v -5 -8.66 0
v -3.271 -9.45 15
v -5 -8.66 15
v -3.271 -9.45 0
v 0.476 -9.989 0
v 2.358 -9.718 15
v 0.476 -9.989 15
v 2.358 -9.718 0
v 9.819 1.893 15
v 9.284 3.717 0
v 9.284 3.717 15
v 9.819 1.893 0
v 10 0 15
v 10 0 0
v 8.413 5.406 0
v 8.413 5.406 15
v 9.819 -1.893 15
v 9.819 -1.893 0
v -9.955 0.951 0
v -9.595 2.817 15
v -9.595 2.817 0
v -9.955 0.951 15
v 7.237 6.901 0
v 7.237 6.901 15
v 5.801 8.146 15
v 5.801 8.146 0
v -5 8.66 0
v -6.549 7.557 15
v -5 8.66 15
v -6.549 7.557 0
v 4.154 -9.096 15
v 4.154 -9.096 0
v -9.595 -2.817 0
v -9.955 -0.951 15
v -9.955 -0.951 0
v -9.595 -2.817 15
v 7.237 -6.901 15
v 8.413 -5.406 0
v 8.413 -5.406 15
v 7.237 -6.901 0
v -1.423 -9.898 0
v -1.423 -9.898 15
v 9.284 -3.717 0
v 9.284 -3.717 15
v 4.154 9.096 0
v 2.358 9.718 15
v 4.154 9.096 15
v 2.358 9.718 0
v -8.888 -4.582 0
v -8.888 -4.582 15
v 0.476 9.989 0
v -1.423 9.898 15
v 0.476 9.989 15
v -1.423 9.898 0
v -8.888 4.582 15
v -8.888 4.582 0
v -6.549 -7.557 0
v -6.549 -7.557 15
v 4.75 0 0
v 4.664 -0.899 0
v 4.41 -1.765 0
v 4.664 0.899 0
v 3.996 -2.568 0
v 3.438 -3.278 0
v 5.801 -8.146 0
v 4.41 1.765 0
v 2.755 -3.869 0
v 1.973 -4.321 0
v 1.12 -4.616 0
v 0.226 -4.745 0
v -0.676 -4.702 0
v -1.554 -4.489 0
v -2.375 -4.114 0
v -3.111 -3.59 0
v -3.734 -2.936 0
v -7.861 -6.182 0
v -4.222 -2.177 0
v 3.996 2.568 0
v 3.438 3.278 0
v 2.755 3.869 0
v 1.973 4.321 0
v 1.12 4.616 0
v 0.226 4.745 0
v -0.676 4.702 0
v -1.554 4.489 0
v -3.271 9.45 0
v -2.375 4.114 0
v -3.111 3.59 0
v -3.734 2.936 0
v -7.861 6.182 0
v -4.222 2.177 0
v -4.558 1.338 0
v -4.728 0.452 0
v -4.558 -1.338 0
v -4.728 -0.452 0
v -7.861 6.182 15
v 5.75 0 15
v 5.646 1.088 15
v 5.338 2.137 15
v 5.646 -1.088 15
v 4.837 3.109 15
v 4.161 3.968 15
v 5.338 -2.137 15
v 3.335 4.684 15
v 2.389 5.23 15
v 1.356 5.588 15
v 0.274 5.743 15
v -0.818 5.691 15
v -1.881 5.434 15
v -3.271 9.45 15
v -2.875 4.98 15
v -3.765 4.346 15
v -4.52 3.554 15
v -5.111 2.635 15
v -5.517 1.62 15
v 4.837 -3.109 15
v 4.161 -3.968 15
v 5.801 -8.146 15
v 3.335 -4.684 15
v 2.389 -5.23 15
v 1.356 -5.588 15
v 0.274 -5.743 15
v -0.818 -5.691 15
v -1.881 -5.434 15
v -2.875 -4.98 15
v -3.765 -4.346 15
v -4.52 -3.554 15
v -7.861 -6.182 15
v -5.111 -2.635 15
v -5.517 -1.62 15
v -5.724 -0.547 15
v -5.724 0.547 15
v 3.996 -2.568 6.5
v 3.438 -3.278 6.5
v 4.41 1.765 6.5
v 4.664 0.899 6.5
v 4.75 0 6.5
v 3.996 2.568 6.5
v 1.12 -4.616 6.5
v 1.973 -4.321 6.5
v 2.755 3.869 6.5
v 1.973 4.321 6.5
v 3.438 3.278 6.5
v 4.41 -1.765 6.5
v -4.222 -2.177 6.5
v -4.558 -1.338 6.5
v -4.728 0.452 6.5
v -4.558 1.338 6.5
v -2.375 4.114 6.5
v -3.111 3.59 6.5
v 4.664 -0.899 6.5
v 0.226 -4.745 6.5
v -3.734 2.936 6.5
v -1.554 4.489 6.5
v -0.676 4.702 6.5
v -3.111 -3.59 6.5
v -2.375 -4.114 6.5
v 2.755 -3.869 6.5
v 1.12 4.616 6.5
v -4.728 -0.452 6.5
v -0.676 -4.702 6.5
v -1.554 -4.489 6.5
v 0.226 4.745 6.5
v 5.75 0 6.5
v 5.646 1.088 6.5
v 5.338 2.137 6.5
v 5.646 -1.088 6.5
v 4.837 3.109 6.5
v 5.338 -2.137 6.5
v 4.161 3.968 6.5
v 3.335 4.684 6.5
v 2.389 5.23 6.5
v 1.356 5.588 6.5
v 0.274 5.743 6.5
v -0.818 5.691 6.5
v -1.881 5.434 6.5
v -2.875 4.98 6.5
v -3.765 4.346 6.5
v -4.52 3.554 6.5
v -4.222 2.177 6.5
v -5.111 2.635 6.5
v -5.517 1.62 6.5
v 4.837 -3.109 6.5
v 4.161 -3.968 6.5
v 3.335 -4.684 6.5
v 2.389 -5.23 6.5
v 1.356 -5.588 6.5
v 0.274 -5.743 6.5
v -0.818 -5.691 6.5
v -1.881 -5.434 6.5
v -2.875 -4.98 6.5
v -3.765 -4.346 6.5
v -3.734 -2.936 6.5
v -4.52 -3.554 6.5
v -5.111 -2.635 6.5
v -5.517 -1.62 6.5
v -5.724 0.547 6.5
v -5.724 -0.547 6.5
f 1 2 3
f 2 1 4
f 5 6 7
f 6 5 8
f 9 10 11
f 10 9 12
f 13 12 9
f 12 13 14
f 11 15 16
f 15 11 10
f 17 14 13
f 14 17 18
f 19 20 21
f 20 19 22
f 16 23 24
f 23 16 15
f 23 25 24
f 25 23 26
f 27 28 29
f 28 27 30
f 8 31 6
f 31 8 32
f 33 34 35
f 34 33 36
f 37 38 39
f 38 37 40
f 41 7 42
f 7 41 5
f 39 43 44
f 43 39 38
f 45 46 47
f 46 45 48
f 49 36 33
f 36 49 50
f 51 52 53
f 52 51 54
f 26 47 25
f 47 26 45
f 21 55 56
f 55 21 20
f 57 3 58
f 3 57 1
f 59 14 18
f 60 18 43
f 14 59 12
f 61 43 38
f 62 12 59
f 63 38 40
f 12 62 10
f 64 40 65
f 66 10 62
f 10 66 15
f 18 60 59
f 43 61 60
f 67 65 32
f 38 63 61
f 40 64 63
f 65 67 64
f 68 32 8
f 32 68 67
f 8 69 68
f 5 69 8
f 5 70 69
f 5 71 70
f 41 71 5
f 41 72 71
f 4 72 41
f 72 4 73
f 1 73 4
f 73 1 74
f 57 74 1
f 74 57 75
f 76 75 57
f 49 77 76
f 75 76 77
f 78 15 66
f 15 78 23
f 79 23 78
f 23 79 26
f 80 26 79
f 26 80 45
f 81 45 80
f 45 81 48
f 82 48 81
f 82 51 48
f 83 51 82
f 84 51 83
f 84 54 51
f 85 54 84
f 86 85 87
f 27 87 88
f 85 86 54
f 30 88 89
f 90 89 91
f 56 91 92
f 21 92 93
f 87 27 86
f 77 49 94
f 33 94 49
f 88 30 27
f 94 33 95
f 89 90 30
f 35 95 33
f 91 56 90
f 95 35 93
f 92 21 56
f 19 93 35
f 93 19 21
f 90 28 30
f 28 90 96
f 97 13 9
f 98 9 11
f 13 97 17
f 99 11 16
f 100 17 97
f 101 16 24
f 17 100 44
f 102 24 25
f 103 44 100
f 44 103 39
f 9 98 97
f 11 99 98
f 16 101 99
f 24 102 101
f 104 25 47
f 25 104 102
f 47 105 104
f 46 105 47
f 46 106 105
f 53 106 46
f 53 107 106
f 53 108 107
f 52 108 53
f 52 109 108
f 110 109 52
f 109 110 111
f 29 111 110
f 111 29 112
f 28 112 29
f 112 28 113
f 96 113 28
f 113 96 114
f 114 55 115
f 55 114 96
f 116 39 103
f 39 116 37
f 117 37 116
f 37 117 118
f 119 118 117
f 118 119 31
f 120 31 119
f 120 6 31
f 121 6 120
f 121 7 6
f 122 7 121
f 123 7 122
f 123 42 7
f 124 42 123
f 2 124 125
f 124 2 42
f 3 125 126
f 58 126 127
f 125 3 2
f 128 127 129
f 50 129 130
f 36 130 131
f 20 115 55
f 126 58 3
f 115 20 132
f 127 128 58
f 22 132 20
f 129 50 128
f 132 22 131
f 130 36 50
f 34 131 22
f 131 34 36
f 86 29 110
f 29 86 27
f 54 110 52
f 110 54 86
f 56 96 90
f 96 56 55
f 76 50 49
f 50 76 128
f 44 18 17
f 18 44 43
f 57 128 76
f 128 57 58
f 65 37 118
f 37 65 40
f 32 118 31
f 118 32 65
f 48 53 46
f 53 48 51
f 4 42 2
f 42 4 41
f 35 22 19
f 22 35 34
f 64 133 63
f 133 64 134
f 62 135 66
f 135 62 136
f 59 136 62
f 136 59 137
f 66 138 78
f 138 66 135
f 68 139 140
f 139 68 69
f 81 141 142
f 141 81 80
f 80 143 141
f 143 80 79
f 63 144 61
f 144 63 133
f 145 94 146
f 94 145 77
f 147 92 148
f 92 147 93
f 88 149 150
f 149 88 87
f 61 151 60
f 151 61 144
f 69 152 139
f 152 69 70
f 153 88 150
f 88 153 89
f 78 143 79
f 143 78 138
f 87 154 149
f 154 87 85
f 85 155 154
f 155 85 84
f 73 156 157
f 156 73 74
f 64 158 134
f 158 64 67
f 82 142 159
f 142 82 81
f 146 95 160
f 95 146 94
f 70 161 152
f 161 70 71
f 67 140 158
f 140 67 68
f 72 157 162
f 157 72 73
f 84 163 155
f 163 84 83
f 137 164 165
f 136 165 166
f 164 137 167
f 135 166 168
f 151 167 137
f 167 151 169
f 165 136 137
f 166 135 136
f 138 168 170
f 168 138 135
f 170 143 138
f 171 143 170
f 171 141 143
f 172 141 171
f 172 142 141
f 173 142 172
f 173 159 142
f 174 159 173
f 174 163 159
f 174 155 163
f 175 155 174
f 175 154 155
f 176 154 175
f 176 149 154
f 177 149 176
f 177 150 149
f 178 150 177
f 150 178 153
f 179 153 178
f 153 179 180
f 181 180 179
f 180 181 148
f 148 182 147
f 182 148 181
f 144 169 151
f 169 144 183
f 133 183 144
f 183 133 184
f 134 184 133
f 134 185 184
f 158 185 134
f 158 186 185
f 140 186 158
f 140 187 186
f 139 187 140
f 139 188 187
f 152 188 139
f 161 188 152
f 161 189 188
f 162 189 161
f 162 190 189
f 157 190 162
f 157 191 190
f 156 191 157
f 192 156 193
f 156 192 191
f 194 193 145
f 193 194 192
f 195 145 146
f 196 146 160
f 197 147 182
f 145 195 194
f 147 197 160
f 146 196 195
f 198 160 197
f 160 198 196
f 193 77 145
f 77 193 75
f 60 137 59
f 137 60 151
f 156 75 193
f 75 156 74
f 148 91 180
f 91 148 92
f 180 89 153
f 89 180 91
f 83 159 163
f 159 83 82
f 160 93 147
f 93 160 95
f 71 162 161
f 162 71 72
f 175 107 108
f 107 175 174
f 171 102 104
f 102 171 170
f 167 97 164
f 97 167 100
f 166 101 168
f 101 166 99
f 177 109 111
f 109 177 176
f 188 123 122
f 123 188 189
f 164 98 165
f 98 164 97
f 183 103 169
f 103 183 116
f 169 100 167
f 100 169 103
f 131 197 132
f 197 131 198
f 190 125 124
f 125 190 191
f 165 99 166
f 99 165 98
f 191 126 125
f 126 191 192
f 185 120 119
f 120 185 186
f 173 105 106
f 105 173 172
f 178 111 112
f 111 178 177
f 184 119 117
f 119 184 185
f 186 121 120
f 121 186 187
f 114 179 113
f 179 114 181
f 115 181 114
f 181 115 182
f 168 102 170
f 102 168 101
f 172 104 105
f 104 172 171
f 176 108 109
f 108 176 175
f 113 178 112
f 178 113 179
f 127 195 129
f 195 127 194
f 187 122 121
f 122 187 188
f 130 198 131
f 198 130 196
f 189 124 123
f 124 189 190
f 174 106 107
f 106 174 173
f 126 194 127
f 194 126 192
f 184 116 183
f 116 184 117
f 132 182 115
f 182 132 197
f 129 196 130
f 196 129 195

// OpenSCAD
pen_shaft_d = 11.5;
pen_cap_d   = 9.5;

pen_cap_l   = 6.5;
pen_shaft_l = 8.5;

total_d = 20;

height = pen_cap_l + pen_shaft_l;
ROUND  = 33;

difference() {
    cylinder(h = height,      d = total_d,     $fn = ROUND);
    cylinder(h = pen_cap_l,   d = pen_cap_d,   $fn = ROUND);
    translate([0, 0, pen_cap_l])
    cylinder(h = pen_shaft_l, d = pen_shaft_d, $fn = ROUND);
}
